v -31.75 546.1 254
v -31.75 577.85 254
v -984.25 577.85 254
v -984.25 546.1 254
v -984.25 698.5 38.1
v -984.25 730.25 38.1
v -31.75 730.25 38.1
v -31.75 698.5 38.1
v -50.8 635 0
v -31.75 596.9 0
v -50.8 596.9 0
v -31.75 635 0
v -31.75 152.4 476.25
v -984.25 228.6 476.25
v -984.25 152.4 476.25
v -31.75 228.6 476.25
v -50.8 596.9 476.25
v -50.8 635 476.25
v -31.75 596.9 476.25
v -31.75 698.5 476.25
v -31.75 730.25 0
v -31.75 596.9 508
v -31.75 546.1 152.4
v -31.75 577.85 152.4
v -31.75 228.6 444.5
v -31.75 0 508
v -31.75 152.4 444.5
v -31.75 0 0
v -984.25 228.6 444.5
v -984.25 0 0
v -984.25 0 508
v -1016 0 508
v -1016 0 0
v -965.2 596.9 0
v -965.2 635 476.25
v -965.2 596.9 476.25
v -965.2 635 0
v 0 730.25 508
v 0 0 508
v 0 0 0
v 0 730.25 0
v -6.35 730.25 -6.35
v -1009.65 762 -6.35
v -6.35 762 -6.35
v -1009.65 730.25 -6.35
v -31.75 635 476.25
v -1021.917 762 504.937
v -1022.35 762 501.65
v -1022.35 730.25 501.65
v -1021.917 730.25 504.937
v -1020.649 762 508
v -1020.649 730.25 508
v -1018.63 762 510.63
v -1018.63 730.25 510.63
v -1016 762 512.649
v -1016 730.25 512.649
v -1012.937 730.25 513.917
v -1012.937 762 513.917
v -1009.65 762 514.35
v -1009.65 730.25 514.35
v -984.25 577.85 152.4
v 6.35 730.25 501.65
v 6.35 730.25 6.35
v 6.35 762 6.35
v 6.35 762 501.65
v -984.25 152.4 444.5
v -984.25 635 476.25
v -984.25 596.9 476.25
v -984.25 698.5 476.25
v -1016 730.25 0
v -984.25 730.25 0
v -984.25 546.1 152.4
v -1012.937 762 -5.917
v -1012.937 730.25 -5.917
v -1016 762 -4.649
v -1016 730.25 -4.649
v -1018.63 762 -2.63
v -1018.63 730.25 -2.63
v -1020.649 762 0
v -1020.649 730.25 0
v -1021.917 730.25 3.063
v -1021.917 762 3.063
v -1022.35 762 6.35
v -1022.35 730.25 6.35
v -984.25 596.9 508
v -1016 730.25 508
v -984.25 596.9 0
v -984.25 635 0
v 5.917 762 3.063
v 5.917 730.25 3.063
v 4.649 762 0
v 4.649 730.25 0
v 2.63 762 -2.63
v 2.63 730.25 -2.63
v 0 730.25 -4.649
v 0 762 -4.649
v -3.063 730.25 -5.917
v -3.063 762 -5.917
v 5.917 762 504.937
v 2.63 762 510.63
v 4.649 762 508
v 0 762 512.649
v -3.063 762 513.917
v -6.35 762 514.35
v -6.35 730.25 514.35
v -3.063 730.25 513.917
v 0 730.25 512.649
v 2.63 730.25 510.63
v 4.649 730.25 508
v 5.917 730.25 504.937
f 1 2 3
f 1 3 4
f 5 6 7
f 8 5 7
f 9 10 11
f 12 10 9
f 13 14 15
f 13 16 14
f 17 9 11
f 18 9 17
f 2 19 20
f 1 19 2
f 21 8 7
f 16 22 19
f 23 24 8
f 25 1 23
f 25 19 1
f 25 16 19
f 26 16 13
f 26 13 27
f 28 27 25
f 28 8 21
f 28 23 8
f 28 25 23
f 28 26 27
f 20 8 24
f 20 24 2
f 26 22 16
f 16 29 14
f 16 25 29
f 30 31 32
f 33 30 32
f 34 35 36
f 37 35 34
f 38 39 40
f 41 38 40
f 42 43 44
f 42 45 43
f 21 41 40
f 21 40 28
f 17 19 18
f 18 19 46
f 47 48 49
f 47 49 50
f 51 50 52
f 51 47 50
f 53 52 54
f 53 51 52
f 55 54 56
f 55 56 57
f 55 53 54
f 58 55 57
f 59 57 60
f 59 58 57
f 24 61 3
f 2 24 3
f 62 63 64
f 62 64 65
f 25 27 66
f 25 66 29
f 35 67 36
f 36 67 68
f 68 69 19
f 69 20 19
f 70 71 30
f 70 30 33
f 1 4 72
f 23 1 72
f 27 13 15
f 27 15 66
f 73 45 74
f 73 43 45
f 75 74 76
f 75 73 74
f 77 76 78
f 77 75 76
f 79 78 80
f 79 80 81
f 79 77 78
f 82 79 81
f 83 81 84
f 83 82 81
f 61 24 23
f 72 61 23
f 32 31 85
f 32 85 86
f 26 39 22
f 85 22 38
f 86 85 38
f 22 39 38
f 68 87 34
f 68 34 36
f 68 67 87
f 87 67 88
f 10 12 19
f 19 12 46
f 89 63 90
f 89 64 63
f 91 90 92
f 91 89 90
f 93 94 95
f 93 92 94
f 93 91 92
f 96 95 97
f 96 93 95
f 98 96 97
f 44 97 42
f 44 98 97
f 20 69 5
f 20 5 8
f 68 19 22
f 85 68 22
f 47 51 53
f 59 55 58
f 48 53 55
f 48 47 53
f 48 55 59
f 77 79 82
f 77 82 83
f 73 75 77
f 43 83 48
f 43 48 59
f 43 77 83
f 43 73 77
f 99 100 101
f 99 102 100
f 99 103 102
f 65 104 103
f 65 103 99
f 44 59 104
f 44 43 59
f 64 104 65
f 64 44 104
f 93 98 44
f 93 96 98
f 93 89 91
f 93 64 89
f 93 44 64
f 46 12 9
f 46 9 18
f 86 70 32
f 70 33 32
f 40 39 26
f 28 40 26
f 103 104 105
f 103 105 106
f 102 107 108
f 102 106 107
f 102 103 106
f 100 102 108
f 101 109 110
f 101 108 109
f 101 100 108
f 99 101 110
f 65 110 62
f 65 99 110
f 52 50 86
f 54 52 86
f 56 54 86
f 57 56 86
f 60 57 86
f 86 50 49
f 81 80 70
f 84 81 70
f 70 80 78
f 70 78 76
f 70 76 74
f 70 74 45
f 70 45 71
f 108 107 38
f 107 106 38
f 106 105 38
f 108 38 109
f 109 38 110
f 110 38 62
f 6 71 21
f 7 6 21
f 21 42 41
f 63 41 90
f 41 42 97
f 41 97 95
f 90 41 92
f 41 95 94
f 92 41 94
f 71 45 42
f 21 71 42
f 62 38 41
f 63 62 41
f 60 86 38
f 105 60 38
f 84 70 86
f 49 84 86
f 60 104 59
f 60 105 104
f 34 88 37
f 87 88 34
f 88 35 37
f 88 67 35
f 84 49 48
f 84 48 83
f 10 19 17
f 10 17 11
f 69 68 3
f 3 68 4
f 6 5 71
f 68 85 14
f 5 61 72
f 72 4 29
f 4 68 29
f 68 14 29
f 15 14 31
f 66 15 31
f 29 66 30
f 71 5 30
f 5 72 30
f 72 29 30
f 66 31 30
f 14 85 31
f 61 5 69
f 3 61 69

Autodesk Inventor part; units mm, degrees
ref_plane "YZ Plane" through (0, 0, 0) normal (1, 0, 0) x (0, 1, 0)
ref_plane "XZ Plane" through (0, 0, 0) normal (0, 1, 0) x (-1, 0, 0)
sketch "Sketch1" plane through (0, 0, 0) normal (0, 1, 0) x (-1, 0, 0)
  point P0 (0, 0)
sketch "Sketch2" plane through (0, 0, 0) normal (0, 1, 0) x (-1, 0, 0)
  line L0 (0, 0) -> (1016, 0)
  line L1 (1016, 0) -> (1016, 508)
  line L2 (1016, 508) -> (0, 508)
  line L3 (0, 508) -> (0, 0)
  line L4 (0, 508) -> (31.75, 508)
  line L5 (31.75, 508) -> (31.75, 0)
  line L6 (31.75, 0) -> (0, 0)
  line L7 (0, 0) -> (0, 508)
  line L8 (1016, 508) -> (984.25, 508)
  line L9 (984.25, 508) -> (984.25, 0)
  line L10 (984.25, 0) -> (1016, 0)
  line L11 (1016, 0) -> (1016, 508)
  dimension "d0" = 1016
  dimension "d1" = 508
  dimension "d2" = 31.75
  dimension "d3" = 31.75
extrude "Extrusion1" add sketch "Sketch2" along normal blind 730.25 contours L3 L2 L5 L0 | L9 L2 L1 L0
sketch "Sketch3" plane through (0, 730.25, 0) normal (0, 1, 0) x (1, 0, 0)
  line L0 (0, -508) -> (0, 0) projected
  line L1 (-1016, 0) -> (-1016, -508) projected
  line L2 (0, 0) -> (-1016, 0)
  line L3 (-1016, 0) -> (-1016, -508)
  line L4 (-1016, -508) -> (0, -508)
  line L5 (0, -508) -> (0, 0)
  line L6 (-1022.35, 6.35) -> (6.35, 6.35)
  line L7 (6.35, 6.35) -> (6.35, -514.35)
  line L8 (6.35, -514.35) -> (-1022.35, -514.35)
  line L9 (-1022.35, -514.35) -> (-1022.35, 6.35)
  dimension "d6" = 6.35
extrude "Extrusion2" add sketch "Sketch3" along normal blind 31.75 contours L4 L1 L2 L0 | L6 L7 L8 L9
sketch "Sketch4" plane through (0, 730.25, 0) normal (0, -1, 0) x (1, 0, 0)
  line L0 (-984.25, 508) -> (-984.25, 0) projected
  line L1 (-31.75, 508) -> (-984.25, 508)
  line L2 (-984.25, 508) -> (-984.25, 38.1)
  line L3 (-984.25, 38.1) -> (-31.75, 38.1)
  line L4 (-31.75, 38.1) -> (-31.75, 508)
  point P0 (0, 0)
  dimension "d9" = 469.9
extrude "Extrusion3" add sketch "Sketch4" along normal blind 31.75
fillet "Fillet1" radius 12.7 4 edges at (6.35, 746.125, -6.35) (-1022.35, 746.125, -6.35) (-1022.35, 746.125, 514.35) (6.35, 746.125, 514.35)
sketch "Sketch5" plane through (-31.75, 0, 0) normal (-1, 0, 0) x (0, 0, 1)
  line L0 (0, 0) -> (0, 730.25) projected
  line L1 (508, 0) -> (508, 730.25) projected
  line L2 (0, 577.85) -> (508, 577.85)
  line L3 (508, 577.85) -> (508, 546.1)
  line L4 (508, 546.1) -> (0, 546.1)
  line L5 (0, 546.1) -> (0, 577.85)
  line L6 (0, 730.25) -> (38.1, 730.25) projected
  line L7 (152.4, 577.85) -> (152.4, 546.1)
  line L8 (254, 577.85) -> (254, 546.1)
  point P0 (0, 546.1)
  dimension "d13" = 152.4
  dimension "d14" = 31.75
  dimension "d17" = 152.4
extrude "Extrusion4" add sketch "Sketch5" along normal up to surface (952.5 mm away) contours L7 L2 L8 L4
sketch "Sketch6" plane through (-31.75, 0, 0) normal (-1, 0, 0) x (0, 0, 1)
  line L0 (0, 0) -> (508, 0) projected
  line L1 (508, 0) -> (508, 730.25) projected
  line L2 (0, 730.25) -> (508, 730.25) projected
  line L3 (0, 0) -> (0, 730.25) projected
  line L4 (6.35, 730.25) -> (501.65, 730.25) projected
  line L5 (444.5, 228.6) -> (476.25, 228.6)
  line L6 (476.25, 228.6) -> (476.25, 152.4)
  line L7 (476.25, 152.4) -> (444.5, 152.4)
  line L8 (444.5, 152.4) -> (444.5, 228.6)
  point P0 (476.25, 190.5)
  dimension "d18" = 31.75
  dimension "d19" = 76.2
  dimension "d20" = 31.75
  dimension "d21" = 152.4
extrude "Extrusion5" add sketch "Sketch6" along normal up to surface (952.5 mm away) contours L5 L6 L7 L8
sketch "Sketch7" plane through (-31.75, 0, 0) normal (-1, 0, 0) x (0, 0, 1)
  line L0 (508, 698.5) -> (38.1, 698.5) projected
  line L1 (508, 698.5) -> (476.25, 698.5)
  line L2 (476.25, 698.5) -> (476.25, 596.9)
  line L3 (476.25, 596.9) -> (508, 596.9)
  line L4 (508, 596.9) -> (508, 698.5)
  point P0 (0, 0)
  dimension "d24" = 31.75
  dimension "d25" = 101.6
extrude "Extrusion6" add sketch "Sketch7" along normal up to surface (952.5 mm away)
sketch "Sketch8" plane through (-31.75, 0, 0) normal (-1, 0, 0) x (0, 0, 1)
  line L0 (476.25, 596.9) -> (476.25, 698.5) projected
  line L1 (0, 635) -> (476.25, 635)
  line L2 (476.25, 635) -> (476.25, 596.9)
  line L3 (476.25, 596.9) -> (0, 596.9)
  line L4 (0, 596.9) -> (0, 635)
  line L5 (0, 0) -> (0, 730.25) projected
  dimension "d28" = 38.1
extrude "Extrusion7" add sketch "Sketch8" along normal blind 19.05 separate body
ref_plane "Work Plane1" through (-508, 0, 0) normal (-1, 0, 0) x (0, 0, 1)
mirror "Mirror1" about plane through (-508, 0, 0) normal (-1, 0, 0) of "Extrusion7" bodies 2
properties part number "Desk" material "Wood (Birch)"
